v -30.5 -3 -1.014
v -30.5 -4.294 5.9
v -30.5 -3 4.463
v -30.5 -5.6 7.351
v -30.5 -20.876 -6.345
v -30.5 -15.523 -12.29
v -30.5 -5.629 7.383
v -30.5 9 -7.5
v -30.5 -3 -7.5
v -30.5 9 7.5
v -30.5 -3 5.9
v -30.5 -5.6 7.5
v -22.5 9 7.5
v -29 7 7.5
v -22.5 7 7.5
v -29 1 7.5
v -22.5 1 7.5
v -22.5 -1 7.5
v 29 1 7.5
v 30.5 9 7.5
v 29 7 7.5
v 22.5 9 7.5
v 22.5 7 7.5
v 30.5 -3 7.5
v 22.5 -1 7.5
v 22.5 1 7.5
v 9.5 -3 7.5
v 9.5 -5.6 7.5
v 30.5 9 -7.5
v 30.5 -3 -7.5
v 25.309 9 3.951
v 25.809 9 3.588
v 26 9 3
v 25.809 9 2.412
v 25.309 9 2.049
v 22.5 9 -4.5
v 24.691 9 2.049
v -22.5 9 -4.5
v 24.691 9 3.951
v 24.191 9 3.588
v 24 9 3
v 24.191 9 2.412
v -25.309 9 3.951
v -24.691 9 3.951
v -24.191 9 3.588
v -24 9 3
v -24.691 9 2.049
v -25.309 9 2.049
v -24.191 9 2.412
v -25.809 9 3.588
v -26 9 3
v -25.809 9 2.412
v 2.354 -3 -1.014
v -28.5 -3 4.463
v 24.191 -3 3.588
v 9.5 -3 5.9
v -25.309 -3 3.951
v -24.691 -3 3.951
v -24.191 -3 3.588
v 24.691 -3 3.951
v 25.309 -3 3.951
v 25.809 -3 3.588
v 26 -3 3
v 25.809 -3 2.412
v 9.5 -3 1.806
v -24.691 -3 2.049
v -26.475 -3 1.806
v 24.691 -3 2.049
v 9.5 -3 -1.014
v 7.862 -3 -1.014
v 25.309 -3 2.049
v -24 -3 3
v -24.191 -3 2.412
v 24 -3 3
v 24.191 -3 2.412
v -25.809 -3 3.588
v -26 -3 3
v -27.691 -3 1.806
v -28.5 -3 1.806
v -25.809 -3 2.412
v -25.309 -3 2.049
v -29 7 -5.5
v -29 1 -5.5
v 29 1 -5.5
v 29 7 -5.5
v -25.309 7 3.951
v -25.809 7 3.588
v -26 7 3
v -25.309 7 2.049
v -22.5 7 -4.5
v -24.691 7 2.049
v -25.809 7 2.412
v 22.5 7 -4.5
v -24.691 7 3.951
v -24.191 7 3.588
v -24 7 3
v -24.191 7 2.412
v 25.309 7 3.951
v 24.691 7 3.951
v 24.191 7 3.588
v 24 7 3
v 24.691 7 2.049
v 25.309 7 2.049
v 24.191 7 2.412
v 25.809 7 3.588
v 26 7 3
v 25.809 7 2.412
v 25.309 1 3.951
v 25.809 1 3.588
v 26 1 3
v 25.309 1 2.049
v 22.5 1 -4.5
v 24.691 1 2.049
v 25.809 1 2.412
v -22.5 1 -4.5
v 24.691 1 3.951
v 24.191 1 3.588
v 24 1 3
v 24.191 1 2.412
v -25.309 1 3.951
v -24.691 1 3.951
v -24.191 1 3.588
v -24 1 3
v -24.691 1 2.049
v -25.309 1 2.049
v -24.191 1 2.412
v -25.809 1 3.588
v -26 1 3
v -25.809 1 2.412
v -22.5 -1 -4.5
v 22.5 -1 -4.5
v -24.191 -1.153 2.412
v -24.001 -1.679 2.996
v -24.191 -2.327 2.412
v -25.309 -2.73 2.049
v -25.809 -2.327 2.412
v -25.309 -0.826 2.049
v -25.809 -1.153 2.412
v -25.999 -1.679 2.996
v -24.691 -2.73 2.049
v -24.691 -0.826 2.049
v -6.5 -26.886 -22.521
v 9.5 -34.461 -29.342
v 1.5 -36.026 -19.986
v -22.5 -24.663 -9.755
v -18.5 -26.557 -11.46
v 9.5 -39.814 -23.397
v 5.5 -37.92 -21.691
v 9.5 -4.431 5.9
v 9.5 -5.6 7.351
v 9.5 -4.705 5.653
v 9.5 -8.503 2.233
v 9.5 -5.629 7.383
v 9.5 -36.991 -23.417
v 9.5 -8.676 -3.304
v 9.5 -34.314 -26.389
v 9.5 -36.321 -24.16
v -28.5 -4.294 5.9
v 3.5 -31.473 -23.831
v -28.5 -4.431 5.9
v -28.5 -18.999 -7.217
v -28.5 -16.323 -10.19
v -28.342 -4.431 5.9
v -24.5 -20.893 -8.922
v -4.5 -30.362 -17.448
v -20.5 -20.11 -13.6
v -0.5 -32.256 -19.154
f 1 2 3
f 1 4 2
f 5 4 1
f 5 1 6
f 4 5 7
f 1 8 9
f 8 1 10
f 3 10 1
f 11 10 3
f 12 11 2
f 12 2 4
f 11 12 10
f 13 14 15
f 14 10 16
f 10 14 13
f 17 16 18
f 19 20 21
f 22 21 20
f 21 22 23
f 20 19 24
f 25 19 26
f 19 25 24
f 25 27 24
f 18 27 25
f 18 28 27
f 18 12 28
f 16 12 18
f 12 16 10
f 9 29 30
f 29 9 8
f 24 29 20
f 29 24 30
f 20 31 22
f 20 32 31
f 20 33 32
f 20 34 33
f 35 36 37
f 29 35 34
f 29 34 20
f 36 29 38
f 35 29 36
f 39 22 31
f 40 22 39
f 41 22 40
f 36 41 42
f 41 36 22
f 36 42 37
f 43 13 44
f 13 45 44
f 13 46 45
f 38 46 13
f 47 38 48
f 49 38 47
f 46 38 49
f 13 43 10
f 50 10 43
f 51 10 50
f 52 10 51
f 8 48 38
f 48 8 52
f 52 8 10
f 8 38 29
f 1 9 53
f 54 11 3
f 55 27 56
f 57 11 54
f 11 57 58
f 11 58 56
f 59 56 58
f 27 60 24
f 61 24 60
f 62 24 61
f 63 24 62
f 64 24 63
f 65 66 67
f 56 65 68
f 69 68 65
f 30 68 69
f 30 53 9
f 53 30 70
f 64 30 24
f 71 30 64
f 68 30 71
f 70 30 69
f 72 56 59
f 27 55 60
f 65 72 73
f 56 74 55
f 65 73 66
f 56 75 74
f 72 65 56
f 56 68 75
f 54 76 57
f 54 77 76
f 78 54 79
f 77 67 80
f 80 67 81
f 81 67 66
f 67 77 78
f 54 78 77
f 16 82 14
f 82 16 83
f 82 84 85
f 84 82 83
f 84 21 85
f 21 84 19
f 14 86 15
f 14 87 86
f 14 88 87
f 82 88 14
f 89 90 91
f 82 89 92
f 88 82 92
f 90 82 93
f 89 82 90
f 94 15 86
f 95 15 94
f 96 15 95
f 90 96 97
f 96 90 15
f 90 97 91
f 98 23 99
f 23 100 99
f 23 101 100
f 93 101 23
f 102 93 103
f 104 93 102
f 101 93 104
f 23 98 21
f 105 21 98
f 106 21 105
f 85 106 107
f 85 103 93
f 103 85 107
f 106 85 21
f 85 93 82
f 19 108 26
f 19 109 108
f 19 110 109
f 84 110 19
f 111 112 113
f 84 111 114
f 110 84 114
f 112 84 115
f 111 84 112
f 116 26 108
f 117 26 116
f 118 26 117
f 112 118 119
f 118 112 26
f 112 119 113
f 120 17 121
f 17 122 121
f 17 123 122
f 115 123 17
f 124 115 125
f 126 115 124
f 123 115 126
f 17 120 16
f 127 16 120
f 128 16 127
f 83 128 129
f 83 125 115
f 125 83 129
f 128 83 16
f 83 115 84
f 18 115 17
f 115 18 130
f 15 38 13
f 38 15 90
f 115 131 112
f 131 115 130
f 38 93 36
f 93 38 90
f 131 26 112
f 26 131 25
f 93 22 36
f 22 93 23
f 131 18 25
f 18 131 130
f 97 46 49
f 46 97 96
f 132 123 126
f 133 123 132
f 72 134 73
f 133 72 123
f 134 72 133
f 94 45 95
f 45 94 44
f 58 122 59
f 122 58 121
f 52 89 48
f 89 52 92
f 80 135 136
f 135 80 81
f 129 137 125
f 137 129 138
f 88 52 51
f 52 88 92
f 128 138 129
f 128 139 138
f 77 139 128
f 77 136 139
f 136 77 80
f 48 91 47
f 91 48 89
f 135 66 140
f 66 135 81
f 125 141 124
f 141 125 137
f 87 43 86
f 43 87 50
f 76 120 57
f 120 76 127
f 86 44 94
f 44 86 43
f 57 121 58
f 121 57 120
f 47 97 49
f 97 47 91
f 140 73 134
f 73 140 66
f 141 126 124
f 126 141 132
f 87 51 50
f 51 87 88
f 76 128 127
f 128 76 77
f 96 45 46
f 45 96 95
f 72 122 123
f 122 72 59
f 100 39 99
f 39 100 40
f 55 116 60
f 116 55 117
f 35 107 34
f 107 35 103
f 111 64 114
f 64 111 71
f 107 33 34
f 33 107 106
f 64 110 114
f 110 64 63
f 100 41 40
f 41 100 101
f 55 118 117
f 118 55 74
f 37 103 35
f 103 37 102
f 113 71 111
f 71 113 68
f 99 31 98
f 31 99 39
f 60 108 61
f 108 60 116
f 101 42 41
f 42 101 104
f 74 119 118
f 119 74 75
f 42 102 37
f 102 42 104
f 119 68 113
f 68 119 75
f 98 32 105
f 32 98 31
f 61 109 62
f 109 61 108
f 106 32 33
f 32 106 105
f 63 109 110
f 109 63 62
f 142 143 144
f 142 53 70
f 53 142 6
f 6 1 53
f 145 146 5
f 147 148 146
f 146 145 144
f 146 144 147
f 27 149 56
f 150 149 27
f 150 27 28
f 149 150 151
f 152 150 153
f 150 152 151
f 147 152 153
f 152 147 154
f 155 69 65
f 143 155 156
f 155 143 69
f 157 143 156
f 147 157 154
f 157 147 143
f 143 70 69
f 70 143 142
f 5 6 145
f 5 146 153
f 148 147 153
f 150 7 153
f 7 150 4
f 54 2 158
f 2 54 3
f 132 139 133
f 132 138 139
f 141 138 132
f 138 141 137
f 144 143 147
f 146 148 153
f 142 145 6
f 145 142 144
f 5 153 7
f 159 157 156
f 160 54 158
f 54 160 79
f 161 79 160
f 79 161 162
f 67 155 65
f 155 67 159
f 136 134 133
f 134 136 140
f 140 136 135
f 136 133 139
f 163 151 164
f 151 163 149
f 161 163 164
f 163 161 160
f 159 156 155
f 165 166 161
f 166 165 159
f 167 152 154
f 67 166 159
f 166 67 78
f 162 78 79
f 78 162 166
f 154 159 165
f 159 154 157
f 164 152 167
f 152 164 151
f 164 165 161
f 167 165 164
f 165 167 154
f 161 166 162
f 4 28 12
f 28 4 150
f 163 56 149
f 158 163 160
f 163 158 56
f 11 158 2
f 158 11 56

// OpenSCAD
$fn = 10;
MAX_CILINDROS = 45;

mirror()
union() {
    //relleno union
    translate([-9.5, -5.6, 5.9]) rotate([90, 0, 90]) linear_extrude(height = 40) square([3.4, 1.6]);


    difference() {
        //base
        translate([0, 3, 0]) cube([61, 12, 15], center = true);

        //sensor width
        translate([0, 4, 2]) cube([58, 6, 15], center = true);
        //translate([11, 1, 4]) rotate([-90, 0, 0]) cylinder(5, d = 18, true);
        //hueco micro/receptor
        translate([0, 7, 3]) cube([MAX_CILINDROS, 16, 15], center = true);
        
        translate([25, 2, 3]) rotate([-90, 0, 0]) cylinder(h = 15, d = 2, center = true);
        
        mirror([1, 0, 0]) translate([25, 2, 3]) rotate([-90, 0, 0]) cylinder(h = 15, d = 2, center = true);

        //    translate([-11.5, 1.9, 7.7]) rotate([42, 0, 0]) translate([0, -4, 1.5]) rotate([180, -90, 0]) linear_extrude(height = 40, scale = [1, 0.444]) square([1.3, 45]);
        //    translate([-41.5, 1.9, 7.7]) rotate([42, 0, 0]) translate([0, -4, 1.5]) rotate([180, -90, 0]) linear_extrude(height = 40, scale = [1, 0.444]) square([1.3, 45]);
    }

    translate([0, 0, 3.4]) difference() {
        //exterior enganche
        translate([-9.5, 3.7, -0.4]) rotate([42, 0, 0]) translate([0, -4, 1.5]) rotate([180, -90, 0]) linear_extrude(height = 40, scale = [1, 0.446]) square([8, 46]);
        
        //hueco enganche
        translate([-11.5, 2.9, 1.7]) rotate([42, 0, 0]) translate([0, -4, 1.5]) rotate([180, -90, 0]) linear_extrude(height = 40, scale = [1, 0.446]) square([4, 46]);

        //hueco micro/receptor
        translate([0, 7, 3]) cube([MAX_CILINDROS, 16, 15], center = true);
    }
}
